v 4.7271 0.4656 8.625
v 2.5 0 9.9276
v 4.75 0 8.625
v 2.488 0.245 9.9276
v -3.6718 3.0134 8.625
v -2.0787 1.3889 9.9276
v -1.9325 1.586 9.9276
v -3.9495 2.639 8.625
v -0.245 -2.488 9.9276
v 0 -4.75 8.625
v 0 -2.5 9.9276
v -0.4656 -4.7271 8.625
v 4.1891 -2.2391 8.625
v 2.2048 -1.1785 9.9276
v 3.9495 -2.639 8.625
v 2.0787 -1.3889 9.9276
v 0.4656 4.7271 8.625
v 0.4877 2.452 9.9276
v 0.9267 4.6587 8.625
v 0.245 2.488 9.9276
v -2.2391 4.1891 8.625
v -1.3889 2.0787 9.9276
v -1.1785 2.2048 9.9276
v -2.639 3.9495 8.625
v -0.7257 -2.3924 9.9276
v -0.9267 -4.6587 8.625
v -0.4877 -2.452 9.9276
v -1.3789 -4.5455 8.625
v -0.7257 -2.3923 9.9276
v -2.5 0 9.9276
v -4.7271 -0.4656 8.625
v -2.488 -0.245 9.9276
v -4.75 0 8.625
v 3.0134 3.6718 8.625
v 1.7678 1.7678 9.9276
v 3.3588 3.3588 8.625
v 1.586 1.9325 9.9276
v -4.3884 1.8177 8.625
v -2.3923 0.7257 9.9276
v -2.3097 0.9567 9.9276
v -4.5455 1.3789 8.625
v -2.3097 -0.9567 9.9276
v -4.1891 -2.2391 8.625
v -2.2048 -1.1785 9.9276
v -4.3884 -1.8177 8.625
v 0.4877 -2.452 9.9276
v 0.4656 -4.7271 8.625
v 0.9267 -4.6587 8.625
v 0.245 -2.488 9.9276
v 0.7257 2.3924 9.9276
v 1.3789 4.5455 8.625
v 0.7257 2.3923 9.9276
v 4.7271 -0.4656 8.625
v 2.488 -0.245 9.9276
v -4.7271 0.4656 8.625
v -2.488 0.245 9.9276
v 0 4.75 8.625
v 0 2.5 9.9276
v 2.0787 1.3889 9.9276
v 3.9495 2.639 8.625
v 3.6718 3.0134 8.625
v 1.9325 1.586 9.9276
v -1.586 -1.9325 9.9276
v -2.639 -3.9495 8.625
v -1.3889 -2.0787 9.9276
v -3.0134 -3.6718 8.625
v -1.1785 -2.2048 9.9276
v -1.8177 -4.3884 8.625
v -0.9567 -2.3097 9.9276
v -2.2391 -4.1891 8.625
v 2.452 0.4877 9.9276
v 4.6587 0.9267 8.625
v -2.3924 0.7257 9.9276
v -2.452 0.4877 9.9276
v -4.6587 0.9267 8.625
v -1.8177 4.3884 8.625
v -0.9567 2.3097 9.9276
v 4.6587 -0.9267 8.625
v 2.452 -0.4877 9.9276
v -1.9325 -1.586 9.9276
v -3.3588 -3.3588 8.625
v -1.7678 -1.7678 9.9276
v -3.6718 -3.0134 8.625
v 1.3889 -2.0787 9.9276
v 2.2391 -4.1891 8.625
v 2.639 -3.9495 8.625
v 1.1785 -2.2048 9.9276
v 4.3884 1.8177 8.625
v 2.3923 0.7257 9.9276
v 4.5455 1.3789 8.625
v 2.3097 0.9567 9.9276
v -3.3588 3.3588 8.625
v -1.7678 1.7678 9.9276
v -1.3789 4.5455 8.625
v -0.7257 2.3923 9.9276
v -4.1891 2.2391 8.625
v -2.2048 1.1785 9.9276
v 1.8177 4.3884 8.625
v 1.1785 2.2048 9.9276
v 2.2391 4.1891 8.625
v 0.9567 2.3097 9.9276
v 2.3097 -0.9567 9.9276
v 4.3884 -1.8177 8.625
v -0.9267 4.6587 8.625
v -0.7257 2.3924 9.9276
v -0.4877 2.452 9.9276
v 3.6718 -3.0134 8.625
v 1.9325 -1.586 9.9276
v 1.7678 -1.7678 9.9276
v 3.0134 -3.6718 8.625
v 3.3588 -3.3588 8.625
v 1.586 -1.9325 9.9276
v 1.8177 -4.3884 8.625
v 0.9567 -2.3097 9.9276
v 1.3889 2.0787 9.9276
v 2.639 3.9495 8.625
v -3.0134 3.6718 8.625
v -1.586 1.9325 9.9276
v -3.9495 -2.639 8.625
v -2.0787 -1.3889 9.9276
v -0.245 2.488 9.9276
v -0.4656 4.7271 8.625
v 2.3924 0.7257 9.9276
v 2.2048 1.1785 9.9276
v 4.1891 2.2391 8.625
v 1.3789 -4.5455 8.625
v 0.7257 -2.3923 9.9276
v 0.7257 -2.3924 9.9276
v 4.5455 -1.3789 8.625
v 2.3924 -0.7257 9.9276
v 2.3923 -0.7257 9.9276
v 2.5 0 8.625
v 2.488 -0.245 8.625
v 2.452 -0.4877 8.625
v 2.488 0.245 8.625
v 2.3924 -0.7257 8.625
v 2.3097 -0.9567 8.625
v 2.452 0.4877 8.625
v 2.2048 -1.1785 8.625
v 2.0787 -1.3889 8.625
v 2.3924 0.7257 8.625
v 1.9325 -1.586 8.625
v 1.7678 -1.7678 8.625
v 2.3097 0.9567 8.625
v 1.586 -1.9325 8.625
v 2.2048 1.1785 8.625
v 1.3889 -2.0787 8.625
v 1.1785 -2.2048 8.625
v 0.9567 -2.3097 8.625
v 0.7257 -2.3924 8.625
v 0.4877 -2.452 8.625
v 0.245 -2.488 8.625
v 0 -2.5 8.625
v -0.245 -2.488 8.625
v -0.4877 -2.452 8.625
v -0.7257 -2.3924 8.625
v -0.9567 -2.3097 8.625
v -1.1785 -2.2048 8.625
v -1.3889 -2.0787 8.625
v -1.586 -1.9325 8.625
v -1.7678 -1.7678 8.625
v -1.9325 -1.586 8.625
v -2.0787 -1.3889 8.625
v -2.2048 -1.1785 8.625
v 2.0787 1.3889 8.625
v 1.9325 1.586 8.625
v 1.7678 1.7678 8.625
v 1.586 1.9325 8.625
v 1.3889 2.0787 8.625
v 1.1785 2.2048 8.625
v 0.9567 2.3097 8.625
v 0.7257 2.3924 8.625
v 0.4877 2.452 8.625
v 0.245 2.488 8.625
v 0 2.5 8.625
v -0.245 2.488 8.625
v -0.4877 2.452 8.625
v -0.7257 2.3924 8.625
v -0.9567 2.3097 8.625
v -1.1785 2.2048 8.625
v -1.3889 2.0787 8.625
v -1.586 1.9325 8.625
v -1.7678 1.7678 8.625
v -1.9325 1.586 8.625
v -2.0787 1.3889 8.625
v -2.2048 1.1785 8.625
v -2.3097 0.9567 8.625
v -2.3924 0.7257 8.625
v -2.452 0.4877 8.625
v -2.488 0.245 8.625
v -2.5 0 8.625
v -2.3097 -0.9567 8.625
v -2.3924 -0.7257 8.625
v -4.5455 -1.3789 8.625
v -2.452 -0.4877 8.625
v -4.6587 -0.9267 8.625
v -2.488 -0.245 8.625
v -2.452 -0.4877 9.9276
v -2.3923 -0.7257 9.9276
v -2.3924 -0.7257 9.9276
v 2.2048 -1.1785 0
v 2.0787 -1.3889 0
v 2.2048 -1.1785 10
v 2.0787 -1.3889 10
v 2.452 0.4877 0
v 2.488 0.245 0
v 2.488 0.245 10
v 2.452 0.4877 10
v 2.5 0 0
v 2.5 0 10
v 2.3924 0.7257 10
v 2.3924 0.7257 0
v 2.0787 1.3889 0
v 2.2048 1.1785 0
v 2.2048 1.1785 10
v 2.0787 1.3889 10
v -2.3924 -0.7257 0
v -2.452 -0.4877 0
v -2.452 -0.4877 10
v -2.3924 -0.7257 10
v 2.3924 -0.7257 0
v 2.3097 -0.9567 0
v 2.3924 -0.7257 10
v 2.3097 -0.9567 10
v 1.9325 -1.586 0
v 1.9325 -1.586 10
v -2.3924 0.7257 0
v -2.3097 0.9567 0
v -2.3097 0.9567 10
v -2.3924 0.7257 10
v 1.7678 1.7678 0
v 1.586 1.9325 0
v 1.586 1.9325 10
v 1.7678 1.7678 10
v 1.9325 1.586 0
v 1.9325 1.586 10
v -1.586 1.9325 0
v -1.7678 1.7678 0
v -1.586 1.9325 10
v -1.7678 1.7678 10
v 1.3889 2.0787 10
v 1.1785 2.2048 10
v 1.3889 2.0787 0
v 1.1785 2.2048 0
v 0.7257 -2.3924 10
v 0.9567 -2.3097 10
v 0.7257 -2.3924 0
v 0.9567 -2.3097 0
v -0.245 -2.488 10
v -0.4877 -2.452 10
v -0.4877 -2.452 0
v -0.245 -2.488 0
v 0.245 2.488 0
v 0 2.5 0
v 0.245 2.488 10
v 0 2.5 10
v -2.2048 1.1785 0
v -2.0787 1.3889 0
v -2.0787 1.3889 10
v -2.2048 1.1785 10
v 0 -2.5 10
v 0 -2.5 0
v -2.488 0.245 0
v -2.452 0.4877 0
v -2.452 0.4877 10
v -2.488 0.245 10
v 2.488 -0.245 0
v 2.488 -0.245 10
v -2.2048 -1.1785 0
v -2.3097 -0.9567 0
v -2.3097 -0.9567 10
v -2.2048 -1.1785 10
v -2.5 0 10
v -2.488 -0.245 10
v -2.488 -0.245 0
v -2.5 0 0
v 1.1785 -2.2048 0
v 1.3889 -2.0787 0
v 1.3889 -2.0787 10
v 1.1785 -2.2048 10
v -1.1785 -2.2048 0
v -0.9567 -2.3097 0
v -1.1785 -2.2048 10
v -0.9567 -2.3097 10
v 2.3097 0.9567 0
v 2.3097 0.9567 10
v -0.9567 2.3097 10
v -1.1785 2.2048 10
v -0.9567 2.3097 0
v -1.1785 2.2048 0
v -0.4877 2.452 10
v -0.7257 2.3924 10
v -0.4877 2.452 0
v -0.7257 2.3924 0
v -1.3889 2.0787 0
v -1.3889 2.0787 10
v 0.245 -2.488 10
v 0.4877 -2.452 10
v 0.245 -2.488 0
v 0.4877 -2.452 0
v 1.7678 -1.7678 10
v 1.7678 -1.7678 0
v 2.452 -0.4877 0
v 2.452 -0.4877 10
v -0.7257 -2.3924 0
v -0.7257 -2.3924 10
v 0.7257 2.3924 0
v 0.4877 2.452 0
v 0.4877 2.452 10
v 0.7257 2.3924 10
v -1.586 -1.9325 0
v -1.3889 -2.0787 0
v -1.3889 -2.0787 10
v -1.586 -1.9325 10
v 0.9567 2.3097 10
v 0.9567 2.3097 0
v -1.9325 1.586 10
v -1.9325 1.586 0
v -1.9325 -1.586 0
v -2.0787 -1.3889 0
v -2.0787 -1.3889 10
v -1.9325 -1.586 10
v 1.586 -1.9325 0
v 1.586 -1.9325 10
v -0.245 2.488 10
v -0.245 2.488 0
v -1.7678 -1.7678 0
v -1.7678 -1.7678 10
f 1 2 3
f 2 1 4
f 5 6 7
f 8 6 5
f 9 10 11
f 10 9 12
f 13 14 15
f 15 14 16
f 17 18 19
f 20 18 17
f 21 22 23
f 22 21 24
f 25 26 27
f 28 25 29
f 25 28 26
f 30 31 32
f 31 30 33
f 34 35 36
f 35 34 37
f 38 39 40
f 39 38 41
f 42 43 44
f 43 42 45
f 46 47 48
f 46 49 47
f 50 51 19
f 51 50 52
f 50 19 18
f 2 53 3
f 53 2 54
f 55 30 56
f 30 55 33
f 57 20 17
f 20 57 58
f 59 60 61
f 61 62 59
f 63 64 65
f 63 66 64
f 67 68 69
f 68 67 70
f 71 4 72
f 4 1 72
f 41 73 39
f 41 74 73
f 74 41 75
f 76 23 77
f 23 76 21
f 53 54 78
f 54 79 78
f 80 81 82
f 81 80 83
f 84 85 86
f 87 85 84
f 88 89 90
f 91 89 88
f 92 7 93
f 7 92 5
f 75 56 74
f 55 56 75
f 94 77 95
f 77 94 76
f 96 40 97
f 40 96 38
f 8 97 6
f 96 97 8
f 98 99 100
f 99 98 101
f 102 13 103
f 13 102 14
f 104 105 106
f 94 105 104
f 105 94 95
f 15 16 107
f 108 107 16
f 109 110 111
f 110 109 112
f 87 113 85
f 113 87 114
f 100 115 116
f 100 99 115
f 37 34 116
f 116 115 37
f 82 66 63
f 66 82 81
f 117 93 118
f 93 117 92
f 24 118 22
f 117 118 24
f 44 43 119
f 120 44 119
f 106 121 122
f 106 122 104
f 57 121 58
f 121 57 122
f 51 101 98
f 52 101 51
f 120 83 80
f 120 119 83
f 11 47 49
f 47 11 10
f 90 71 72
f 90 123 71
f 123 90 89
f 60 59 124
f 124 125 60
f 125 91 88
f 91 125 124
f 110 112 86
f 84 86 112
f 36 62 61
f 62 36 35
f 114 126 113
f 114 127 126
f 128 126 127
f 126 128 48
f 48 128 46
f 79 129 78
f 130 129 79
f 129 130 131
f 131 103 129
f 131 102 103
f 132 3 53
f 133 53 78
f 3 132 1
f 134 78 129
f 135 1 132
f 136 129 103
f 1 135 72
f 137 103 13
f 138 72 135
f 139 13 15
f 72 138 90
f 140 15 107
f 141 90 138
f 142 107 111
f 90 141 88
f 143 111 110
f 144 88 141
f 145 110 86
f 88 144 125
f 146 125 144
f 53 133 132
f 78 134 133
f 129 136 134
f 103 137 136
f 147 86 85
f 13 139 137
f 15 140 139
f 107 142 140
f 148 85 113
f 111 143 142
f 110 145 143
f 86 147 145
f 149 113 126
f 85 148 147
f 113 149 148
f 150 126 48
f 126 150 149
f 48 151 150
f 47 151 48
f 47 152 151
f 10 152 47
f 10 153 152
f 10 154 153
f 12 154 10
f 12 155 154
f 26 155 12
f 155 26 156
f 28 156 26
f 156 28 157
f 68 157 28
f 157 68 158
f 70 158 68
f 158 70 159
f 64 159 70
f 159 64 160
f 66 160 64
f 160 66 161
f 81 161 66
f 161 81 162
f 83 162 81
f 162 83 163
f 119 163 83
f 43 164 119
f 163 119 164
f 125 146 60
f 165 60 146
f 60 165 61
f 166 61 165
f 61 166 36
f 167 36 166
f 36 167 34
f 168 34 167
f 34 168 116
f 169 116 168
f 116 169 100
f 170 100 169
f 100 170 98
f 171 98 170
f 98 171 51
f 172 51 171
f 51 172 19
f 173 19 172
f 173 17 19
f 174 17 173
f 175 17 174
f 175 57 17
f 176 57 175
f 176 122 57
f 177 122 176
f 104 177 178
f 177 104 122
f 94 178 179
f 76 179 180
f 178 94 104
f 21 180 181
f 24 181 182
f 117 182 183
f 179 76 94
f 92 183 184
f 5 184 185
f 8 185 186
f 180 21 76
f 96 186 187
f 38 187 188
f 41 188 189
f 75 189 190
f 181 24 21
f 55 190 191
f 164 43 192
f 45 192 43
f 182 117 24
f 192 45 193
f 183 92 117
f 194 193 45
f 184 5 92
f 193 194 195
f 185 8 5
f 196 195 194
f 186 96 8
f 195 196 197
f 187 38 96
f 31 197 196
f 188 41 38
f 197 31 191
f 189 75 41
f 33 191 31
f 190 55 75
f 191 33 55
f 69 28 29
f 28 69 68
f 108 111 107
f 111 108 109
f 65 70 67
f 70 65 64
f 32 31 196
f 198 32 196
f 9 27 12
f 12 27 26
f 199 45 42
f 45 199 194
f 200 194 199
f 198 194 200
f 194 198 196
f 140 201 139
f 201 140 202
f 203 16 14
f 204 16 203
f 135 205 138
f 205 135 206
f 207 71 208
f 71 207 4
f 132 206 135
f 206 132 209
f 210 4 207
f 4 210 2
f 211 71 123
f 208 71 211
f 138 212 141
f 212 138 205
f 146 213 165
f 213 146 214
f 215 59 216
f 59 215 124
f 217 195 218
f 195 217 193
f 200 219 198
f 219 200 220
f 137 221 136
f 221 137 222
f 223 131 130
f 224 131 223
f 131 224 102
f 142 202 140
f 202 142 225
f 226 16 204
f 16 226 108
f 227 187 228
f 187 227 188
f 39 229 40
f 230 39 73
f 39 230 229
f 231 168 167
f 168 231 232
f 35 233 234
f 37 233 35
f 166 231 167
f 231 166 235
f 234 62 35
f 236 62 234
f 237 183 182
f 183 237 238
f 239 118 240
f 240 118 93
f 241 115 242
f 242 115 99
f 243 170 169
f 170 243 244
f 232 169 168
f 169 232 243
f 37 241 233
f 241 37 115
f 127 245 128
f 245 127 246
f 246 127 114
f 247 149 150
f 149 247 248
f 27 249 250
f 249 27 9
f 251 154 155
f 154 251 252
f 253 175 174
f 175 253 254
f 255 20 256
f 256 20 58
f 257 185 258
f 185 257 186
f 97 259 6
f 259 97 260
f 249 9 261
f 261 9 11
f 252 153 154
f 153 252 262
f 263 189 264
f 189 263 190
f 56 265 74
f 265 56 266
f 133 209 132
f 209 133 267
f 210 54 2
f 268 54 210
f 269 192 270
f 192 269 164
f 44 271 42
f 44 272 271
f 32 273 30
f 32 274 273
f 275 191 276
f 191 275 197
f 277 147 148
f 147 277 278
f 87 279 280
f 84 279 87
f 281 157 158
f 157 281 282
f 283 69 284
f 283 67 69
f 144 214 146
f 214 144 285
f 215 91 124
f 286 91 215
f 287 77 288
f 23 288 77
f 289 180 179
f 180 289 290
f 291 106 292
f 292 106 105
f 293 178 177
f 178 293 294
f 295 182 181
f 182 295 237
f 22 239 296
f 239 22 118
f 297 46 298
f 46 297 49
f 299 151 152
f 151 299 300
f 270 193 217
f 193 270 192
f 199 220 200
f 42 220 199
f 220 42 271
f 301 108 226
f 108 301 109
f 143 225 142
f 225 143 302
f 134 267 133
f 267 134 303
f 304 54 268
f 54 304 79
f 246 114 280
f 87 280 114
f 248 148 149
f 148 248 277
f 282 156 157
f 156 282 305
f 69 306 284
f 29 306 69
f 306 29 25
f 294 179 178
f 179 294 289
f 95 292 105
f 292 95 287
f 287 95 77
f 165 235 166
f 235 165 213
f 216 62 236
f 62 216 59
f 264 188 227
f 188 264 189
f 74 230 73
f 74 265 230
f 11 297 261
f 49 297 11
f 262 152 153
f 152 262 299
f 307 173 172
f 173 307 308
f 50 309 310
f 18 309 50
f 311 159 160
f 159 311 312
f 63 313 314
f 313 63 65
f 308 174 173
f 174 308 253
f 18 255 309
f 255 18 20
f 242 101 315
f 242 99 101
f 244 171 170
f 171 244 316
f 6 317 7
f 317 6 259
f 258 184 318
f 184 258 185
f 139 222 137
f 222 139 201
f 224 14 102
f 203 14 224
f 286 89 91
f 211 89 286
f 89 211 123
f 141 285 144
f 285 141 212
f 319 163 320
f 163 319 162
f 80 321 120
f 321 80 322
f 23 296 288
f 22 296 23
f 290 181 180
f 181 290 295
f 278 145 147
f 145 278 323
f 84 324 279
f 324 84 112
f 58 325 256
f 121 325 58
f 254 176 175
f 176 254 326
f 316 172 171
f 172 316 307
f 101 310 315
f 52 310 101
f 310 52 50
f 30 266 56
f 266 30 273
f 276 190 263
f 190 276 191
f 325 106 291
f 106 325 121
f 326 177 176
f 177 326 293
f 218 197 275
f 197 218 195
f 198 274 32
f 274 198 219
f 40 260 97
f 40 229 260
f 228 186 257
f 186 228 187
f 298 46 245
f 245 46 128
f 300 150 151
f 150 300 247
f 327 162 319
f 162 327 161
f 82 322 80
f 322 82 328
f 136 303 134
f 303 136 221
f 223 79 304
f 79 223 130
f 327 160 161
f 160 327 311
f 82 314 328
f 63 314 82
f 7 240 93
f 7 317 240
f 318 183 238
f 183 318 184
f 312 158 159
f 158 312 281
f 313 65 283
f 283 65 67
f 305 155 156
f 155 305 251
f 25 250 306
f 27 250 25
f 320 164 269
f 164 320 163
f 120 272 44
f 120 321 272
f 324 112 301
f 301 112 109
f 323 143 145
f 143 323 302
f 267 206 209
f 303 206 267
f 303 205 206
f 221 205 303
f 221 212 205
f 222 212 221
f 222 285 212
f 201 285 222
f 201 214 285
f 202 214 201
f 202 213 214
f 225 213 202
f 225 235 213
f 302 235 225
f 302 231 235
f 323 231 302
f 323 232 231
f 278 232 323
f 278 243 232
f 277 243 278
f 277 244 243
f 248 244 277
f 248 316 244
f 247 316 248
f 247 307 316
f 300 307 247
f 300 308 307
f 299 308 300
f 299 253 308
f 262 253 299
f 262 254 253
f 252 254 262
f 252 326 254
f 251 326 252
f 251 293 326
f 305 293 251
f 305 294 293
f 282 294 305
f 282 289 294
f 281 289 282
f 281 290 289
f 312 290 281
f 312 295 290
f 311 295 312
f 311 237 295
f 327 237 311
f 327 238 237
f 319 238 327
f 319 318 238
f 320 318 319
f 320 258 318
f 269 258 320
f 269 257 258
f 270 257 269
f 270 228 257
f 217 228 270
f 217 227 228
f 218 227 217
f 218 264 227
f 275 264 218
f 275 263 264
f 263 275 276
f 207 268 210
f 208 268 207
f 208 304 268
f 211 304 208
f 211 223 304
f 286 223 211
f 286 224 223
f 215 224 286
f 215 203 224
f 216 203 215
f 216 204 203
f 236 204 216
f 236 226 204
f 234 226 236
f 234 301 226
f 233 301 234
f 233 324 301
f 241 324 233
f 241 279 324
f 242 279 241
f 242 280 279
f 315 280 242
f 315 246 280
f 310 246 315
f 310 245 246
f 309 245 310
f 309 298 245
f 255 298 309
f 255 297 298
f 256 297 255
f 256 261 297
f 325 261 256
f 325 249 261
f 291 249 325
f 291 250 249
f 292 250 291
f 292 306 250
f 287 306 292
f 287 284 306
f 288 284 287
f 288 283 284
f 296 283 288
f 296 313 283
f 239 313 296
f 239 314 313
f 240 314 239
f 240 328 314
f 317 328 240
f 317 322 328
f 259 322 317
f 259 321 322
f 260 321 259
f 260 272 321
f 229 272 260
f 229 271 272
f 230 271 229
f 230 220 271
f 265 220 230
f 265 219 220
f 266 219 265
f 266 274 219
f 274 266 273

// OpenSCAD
module dome_head_screw() {
    $fn = 64;
    // Screw head
    difference() {
        translate([0, 0, 10])
            cylinder(h = 2.75, d1 = 9.5, d2 = 0, center = true);
        translate([0, 0, 10])
            cylinder(h = 2.75, d = 5.0, center = true);
    }
    // Screw body
    translate([0, 0, 5])
        cylinder(h = 10, d = 5.0, center = true);
}

dome_head_screw();
